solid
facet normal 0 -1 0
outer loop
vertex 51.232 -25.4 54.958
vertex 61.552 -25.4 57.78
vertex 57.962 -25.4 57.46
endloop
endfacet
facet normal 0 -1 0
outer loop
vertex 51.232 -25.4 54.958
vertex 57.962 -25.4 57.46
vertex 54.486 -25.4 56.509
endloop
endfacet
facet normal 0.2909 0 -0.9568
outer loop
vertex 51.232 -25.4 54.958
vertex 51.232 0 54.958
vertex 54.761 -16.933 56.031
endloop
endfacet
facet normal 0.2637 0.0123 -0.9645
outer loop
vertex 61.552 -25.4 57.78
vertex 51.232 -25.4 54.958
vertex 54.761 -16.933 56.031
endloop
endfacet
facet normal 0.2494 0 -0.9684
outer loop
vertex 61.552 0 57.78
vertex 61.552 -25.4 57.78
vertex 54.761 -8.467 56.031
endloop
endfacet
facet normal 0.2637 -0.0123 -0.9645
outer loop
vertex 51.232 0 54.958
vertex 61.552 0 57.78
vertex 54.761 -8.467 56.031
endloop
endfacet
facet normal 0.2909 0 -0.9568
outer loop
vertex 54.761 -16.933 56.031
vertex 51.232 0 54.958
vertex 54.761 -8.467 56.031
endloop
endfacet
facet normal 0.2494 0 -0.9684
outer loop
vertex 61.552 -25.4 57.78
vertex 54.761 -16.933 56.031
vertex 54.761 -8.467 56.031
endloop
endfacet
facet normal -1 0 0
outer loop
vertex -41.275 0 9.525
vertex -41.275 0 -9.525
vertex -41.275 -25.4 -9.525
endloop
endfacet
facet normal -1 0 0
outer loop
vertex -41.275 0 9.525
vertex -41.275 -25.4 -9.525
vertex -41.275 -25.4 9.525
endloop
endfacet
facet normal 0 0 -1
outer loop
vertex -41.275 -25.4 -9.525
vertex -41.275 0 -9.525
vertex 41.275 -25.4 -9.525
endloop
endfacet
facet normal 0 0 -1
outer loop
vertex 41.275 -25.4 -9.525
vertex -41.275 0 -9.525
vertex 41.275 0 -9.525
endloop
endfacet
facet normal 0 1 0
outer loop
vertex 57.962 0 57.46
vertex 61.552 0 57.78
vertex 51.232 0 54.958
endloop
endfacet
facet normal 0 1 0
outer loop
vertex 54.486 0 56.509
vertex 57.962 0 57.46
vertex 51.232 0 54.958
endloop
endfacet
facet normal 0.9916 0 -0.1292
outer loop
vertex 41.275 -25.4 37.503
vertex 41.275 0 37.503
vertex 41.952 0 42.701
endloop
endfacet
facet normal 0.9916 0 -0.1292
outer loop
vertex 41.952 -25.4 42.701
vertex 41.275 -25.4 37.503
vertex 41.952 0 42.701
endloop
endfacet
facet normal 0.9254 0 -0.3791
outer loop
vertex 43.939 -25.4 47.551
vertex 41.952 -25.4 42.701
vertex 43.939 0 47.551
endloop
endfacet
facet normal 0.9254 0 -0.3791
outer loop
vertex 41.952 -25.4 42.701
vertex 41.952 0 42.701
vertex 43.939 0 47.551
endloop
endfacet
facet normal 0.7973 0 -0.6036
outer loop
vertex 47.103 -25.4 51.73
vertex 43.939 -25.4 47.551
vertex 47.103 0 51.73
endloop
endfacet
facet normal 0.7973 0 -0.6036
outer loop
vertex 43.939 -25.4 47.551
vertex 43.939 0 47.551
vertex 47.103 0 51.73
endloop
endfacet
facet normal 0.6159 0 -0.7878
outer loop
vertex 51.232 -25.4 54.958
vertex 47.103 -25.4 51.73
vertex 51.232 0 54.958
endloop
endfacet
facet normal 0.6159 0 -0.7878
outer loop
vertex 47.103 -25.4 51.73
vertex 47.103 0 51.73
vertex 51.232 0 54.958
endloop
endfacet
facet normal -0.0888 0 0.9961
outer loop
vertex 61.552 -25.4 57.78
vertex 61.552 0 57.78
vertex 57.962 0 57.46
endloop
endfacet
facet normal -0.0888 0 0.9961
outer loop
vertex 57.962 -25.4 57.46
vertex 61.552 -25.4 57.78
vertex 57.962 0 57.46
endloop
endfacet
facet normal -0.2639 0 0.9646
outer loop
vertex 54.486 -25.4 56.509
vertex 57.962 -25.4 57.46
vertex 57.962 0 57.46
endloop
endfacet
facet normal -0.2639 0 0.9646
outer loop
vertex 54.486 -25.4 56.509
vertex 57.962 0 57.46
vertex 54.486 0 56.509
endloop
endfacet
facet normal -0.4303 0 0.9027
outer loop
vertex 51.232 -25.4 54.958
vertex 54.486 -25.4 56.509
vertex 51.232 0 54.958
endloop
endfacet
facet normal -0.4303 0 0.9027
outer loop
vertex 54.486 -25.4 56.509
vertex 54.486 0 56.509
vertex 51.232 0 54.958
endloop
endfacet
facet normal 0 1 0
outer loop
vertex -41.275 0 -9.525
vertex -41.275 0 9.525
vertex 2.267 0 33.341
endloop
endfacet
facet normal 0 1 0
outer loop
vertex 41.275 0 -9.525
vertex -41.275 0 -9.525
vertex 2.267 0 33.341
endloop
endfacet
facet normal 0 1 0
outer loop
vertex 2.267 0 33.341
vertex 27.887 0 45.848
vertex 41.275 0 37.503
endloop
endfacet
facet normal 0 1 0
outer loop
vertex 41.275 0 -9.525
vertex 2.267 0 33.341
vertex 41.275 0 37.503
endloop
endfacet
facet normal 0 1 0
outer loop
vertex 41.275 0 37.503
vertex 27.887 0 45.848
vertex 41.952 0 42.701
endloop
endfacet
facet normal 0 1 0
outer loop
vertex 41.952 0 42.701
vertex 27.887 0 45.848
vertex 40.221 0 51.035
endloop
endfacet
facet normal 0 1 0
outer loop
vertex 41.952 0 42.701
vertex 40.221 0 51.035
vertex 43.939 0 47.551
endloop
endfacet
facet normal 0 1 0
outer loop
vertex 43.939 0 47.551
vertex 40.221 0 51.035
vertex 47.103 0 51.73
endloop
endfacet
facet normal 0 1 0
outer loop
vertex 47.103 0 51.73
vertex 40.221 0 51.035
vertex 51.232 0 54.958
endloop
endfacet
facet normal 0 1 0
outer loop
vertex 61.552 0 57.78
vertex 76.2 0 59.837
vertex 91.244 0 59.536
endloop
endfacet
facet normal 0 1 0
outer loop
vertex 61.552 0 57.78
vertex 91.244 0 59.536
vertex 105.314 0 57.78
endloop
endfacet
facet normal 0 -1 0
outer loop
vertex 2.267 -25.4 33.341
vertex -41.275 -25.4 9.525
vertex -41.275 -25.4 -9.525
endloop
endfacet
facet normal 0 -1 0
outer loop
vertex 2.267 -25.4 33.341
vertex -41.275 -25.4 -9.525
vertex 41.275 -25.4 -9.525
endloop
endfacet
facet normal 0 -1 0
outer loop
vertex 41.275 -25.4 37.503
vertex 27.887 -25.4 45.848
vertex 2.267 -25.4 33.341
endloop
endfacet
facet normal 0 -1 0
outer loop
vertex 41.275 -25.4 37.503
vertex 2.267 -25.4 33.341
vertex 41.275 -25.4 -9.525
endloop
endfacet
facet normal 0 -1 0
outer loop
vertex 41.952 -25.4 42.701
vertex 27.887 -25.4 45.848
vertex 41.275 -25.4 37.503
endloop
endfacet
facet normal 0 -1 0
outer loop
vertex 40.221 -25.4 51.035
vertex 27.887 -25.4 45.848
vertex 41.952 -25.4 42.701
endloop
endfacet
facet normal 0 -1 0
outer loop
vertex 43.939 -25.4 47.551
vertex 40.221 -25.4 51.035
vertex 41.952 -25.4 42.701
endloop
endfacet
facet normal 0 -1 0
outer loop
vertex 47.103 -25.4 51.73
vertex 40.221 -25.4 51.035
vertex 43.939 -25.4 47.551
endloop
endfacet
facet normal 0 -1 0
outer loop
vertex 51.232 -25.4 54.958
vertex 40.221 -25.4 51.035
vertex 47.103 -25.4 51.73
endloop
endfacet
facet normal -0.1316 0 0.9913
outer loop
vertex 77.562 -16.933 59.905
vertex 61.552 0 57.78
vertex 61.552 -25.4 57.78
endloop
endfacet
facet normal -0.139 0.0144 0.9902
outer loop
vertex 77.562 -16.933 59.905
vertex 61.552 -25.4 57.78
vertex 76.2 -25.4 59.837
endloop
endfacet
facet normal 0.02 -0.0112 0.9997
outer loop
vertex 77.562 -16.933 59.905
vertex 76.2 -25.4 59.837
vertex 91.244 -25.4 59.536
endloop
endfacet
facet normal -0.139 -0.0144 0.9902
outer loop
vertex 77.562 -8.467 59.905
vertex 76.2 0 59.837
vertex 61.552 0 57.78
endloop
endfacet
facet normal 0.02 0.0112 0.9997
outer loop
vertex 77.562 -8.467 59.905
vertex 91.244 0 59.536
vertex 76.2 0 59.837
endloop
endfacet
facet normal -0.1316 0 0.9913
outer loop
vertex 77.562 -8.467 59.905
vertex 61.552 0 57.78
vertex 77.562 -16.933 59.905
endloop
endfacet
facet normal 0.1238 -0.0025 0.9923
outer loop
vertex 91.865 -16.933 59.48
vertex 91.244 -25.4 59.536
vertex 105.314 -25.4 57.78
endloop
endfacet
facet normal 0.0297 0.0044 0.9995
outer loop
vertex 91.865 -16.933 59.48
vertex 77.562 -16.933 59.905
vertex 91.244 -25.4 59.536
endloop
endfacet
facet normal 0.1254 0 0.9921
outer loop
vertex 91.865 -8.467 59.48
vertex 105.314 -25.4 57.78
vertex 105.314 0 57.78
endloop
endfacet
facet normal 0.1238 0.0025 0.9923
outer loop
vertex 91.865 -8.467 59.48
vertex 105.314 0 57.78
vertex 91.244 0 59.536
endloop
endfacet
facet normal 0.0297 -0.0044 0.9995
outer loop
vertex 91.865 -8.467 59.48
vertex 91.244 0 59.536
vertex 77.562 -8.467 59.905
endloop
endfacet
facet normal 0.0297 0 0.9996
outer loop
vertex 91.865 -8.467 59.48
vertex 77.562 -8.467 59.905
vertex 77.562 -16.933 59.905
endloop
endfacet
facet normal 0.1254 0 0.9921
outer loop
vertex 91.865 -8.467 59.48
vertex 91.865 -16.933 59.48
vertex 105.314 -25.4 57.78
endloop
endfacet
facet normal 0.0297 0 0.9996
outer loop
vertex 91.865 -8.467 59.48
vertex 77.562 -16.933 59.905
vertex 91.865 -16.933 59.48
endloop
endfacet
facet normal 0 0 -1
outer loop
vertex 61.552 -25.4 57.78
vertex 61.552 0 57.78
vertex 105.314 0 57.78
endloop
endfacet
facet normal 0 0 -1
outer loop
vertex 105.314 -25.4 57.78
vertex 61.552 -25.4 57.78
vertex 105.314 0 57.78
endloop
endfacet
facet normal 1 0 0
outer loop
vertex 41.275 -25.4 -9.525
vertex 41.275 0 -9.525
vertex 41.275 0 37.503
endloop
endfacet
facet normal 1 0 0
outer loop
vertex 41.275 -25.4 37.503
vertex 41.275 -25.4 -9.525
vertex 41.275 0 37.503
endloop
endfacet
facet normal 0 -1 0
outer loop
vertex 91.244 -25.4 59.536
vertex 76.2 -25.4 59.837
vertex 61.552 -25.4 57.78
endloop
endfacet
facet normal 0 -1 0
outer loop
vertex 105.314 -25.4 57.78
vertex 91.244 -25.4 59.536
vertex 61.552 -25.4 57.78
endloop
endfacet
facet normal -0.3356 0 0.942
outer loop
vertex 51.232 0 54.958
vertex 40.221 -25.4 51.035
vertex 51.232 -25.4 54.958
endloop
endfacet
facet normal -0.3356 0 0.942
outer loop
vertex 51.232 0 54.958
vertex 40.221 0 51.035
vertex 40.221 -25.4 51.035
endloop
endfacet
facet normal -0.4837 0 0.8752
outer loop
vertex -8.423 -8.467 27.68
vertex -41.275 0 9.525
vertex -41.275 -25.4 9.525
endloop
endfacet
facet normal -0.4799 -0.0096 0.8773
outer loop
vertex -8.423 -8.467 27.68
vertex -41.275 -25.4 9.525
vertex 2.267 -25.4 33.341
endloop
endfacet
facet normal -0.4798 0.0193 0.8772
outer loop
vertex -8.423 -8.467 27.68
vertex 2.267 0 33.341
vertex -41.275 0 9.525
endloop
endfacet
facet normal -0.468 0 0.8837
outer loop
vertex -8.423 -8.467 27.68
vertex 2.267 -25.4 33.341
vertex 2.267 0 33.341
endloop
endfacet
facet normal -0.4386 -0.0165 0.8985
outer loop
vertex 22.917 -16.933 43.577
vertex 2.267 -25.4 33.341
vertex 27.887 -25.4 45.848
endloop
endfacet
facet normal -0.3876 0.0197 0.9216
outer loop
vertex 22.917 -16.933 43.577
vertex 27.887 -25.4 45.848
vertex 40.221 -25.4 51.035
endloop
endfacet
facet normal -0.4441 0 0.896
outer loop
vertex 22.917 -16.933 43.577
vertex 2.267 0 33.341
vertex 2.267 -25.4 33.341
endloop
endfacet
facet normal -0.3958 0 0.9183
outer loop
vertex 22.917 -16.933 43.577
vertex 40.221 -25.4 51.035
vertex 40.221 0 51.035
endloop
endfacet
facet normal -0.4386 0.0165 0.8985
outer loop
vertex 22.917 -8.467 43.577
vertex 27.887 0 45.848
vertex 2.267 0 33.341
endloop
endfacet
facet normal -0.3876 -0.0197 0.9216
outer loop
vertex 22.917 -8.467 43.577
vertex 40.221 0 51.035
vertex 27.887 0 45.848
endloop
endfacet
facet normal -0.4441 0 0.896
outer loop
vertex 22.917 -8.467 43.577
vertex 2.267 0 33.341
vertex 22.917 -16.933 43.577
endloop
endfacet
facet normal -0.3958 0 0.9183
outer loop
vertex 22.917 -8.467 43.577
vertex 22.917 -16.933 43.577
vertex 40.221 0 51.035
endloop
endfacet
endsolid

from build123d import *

# Parameters (mm, degrees)
F0_W     = 82.55
F0_H     = 19.05
F1_DEPTH = 25.4


with BuildPart() as f1:
    # F0 (on Front) → F1 (new body)
    with BuildSketch(Plane.XZ):
        Rectangle(F0_W, F0_H)
        with BuildLine():
            add(Edge.make_bspline(
                [(-41.275, 9.525), (-8.1705508322, 28.056225928), (24.9338983356, 46.587451856), (51.2323798296, 54.9580537814)],
                knots=[0, 0, 0, 0, 0.5432491603, 0.5432491603, 0.5432491603, 0.5432491603], degree=3))
            Line((-41.275, 9.525), (41.275, 9.525))
            Line((41.275, 9.525), (41.275, 37.5034841796))
            ThreePointArc((41.275, 37.5034841796), (43.9393956885, 47.5510138891), (51.2323798296, 54.9580537814))
        make_face()
    extrude(amount=F1_DEPTH)


with BuildPart() as f1b:
    # F0 (on Front) → F1, piece 2 (new body)
    with BuildSketch(Plane.XZ):
        with BuildLine():
            add(Edge.make_bspline(
                [(61.5519915361, 57.7804757157), (78.7005453199, 61.6042213205), (92.0071664175, 59.6923485181), (105.3137875151, 57.7804757157)],
                knots=[0.6170164009, 0.6170164009, 0.6170164009, 0.6170164009, 1, 1, 1, 1], degree=3))
            Line((61.5519915361, 57.7804757157), (105.3137875151, 57.7804757157))
        make_face()
    extrude(amount=F1_DEPTH)


with BuildPart() as f1c:
    # F0 (on Front) → F1, piece 3 (new body)
    with BuildSketch(Plane.XZ):
        with BuildLine():
            ThreePointArc((61.5519915361, 57.7804757157), (56.2026819697, 57.0621465295), (51.2323798296, 54.9580537814))
            add(Edge.make_bspline(
                [(51.2323798296, 54.9580537814), (54.8034233841, 56.0946891441), (58.2489741323, 57.0439763911), (61.5519915361, 57.7804757157)],
                knots=[0.5432491603, 0.5432491603, 0.5432491603, 0.5432491603, 0.6170164009, 0.6170164009, 0.6170164009, 0.6170164009], degree=3))
        make_face()
    extrude(amount=F1_DEPTH)


solid = Compound([f1.part, f1b.part, f1c.part])
